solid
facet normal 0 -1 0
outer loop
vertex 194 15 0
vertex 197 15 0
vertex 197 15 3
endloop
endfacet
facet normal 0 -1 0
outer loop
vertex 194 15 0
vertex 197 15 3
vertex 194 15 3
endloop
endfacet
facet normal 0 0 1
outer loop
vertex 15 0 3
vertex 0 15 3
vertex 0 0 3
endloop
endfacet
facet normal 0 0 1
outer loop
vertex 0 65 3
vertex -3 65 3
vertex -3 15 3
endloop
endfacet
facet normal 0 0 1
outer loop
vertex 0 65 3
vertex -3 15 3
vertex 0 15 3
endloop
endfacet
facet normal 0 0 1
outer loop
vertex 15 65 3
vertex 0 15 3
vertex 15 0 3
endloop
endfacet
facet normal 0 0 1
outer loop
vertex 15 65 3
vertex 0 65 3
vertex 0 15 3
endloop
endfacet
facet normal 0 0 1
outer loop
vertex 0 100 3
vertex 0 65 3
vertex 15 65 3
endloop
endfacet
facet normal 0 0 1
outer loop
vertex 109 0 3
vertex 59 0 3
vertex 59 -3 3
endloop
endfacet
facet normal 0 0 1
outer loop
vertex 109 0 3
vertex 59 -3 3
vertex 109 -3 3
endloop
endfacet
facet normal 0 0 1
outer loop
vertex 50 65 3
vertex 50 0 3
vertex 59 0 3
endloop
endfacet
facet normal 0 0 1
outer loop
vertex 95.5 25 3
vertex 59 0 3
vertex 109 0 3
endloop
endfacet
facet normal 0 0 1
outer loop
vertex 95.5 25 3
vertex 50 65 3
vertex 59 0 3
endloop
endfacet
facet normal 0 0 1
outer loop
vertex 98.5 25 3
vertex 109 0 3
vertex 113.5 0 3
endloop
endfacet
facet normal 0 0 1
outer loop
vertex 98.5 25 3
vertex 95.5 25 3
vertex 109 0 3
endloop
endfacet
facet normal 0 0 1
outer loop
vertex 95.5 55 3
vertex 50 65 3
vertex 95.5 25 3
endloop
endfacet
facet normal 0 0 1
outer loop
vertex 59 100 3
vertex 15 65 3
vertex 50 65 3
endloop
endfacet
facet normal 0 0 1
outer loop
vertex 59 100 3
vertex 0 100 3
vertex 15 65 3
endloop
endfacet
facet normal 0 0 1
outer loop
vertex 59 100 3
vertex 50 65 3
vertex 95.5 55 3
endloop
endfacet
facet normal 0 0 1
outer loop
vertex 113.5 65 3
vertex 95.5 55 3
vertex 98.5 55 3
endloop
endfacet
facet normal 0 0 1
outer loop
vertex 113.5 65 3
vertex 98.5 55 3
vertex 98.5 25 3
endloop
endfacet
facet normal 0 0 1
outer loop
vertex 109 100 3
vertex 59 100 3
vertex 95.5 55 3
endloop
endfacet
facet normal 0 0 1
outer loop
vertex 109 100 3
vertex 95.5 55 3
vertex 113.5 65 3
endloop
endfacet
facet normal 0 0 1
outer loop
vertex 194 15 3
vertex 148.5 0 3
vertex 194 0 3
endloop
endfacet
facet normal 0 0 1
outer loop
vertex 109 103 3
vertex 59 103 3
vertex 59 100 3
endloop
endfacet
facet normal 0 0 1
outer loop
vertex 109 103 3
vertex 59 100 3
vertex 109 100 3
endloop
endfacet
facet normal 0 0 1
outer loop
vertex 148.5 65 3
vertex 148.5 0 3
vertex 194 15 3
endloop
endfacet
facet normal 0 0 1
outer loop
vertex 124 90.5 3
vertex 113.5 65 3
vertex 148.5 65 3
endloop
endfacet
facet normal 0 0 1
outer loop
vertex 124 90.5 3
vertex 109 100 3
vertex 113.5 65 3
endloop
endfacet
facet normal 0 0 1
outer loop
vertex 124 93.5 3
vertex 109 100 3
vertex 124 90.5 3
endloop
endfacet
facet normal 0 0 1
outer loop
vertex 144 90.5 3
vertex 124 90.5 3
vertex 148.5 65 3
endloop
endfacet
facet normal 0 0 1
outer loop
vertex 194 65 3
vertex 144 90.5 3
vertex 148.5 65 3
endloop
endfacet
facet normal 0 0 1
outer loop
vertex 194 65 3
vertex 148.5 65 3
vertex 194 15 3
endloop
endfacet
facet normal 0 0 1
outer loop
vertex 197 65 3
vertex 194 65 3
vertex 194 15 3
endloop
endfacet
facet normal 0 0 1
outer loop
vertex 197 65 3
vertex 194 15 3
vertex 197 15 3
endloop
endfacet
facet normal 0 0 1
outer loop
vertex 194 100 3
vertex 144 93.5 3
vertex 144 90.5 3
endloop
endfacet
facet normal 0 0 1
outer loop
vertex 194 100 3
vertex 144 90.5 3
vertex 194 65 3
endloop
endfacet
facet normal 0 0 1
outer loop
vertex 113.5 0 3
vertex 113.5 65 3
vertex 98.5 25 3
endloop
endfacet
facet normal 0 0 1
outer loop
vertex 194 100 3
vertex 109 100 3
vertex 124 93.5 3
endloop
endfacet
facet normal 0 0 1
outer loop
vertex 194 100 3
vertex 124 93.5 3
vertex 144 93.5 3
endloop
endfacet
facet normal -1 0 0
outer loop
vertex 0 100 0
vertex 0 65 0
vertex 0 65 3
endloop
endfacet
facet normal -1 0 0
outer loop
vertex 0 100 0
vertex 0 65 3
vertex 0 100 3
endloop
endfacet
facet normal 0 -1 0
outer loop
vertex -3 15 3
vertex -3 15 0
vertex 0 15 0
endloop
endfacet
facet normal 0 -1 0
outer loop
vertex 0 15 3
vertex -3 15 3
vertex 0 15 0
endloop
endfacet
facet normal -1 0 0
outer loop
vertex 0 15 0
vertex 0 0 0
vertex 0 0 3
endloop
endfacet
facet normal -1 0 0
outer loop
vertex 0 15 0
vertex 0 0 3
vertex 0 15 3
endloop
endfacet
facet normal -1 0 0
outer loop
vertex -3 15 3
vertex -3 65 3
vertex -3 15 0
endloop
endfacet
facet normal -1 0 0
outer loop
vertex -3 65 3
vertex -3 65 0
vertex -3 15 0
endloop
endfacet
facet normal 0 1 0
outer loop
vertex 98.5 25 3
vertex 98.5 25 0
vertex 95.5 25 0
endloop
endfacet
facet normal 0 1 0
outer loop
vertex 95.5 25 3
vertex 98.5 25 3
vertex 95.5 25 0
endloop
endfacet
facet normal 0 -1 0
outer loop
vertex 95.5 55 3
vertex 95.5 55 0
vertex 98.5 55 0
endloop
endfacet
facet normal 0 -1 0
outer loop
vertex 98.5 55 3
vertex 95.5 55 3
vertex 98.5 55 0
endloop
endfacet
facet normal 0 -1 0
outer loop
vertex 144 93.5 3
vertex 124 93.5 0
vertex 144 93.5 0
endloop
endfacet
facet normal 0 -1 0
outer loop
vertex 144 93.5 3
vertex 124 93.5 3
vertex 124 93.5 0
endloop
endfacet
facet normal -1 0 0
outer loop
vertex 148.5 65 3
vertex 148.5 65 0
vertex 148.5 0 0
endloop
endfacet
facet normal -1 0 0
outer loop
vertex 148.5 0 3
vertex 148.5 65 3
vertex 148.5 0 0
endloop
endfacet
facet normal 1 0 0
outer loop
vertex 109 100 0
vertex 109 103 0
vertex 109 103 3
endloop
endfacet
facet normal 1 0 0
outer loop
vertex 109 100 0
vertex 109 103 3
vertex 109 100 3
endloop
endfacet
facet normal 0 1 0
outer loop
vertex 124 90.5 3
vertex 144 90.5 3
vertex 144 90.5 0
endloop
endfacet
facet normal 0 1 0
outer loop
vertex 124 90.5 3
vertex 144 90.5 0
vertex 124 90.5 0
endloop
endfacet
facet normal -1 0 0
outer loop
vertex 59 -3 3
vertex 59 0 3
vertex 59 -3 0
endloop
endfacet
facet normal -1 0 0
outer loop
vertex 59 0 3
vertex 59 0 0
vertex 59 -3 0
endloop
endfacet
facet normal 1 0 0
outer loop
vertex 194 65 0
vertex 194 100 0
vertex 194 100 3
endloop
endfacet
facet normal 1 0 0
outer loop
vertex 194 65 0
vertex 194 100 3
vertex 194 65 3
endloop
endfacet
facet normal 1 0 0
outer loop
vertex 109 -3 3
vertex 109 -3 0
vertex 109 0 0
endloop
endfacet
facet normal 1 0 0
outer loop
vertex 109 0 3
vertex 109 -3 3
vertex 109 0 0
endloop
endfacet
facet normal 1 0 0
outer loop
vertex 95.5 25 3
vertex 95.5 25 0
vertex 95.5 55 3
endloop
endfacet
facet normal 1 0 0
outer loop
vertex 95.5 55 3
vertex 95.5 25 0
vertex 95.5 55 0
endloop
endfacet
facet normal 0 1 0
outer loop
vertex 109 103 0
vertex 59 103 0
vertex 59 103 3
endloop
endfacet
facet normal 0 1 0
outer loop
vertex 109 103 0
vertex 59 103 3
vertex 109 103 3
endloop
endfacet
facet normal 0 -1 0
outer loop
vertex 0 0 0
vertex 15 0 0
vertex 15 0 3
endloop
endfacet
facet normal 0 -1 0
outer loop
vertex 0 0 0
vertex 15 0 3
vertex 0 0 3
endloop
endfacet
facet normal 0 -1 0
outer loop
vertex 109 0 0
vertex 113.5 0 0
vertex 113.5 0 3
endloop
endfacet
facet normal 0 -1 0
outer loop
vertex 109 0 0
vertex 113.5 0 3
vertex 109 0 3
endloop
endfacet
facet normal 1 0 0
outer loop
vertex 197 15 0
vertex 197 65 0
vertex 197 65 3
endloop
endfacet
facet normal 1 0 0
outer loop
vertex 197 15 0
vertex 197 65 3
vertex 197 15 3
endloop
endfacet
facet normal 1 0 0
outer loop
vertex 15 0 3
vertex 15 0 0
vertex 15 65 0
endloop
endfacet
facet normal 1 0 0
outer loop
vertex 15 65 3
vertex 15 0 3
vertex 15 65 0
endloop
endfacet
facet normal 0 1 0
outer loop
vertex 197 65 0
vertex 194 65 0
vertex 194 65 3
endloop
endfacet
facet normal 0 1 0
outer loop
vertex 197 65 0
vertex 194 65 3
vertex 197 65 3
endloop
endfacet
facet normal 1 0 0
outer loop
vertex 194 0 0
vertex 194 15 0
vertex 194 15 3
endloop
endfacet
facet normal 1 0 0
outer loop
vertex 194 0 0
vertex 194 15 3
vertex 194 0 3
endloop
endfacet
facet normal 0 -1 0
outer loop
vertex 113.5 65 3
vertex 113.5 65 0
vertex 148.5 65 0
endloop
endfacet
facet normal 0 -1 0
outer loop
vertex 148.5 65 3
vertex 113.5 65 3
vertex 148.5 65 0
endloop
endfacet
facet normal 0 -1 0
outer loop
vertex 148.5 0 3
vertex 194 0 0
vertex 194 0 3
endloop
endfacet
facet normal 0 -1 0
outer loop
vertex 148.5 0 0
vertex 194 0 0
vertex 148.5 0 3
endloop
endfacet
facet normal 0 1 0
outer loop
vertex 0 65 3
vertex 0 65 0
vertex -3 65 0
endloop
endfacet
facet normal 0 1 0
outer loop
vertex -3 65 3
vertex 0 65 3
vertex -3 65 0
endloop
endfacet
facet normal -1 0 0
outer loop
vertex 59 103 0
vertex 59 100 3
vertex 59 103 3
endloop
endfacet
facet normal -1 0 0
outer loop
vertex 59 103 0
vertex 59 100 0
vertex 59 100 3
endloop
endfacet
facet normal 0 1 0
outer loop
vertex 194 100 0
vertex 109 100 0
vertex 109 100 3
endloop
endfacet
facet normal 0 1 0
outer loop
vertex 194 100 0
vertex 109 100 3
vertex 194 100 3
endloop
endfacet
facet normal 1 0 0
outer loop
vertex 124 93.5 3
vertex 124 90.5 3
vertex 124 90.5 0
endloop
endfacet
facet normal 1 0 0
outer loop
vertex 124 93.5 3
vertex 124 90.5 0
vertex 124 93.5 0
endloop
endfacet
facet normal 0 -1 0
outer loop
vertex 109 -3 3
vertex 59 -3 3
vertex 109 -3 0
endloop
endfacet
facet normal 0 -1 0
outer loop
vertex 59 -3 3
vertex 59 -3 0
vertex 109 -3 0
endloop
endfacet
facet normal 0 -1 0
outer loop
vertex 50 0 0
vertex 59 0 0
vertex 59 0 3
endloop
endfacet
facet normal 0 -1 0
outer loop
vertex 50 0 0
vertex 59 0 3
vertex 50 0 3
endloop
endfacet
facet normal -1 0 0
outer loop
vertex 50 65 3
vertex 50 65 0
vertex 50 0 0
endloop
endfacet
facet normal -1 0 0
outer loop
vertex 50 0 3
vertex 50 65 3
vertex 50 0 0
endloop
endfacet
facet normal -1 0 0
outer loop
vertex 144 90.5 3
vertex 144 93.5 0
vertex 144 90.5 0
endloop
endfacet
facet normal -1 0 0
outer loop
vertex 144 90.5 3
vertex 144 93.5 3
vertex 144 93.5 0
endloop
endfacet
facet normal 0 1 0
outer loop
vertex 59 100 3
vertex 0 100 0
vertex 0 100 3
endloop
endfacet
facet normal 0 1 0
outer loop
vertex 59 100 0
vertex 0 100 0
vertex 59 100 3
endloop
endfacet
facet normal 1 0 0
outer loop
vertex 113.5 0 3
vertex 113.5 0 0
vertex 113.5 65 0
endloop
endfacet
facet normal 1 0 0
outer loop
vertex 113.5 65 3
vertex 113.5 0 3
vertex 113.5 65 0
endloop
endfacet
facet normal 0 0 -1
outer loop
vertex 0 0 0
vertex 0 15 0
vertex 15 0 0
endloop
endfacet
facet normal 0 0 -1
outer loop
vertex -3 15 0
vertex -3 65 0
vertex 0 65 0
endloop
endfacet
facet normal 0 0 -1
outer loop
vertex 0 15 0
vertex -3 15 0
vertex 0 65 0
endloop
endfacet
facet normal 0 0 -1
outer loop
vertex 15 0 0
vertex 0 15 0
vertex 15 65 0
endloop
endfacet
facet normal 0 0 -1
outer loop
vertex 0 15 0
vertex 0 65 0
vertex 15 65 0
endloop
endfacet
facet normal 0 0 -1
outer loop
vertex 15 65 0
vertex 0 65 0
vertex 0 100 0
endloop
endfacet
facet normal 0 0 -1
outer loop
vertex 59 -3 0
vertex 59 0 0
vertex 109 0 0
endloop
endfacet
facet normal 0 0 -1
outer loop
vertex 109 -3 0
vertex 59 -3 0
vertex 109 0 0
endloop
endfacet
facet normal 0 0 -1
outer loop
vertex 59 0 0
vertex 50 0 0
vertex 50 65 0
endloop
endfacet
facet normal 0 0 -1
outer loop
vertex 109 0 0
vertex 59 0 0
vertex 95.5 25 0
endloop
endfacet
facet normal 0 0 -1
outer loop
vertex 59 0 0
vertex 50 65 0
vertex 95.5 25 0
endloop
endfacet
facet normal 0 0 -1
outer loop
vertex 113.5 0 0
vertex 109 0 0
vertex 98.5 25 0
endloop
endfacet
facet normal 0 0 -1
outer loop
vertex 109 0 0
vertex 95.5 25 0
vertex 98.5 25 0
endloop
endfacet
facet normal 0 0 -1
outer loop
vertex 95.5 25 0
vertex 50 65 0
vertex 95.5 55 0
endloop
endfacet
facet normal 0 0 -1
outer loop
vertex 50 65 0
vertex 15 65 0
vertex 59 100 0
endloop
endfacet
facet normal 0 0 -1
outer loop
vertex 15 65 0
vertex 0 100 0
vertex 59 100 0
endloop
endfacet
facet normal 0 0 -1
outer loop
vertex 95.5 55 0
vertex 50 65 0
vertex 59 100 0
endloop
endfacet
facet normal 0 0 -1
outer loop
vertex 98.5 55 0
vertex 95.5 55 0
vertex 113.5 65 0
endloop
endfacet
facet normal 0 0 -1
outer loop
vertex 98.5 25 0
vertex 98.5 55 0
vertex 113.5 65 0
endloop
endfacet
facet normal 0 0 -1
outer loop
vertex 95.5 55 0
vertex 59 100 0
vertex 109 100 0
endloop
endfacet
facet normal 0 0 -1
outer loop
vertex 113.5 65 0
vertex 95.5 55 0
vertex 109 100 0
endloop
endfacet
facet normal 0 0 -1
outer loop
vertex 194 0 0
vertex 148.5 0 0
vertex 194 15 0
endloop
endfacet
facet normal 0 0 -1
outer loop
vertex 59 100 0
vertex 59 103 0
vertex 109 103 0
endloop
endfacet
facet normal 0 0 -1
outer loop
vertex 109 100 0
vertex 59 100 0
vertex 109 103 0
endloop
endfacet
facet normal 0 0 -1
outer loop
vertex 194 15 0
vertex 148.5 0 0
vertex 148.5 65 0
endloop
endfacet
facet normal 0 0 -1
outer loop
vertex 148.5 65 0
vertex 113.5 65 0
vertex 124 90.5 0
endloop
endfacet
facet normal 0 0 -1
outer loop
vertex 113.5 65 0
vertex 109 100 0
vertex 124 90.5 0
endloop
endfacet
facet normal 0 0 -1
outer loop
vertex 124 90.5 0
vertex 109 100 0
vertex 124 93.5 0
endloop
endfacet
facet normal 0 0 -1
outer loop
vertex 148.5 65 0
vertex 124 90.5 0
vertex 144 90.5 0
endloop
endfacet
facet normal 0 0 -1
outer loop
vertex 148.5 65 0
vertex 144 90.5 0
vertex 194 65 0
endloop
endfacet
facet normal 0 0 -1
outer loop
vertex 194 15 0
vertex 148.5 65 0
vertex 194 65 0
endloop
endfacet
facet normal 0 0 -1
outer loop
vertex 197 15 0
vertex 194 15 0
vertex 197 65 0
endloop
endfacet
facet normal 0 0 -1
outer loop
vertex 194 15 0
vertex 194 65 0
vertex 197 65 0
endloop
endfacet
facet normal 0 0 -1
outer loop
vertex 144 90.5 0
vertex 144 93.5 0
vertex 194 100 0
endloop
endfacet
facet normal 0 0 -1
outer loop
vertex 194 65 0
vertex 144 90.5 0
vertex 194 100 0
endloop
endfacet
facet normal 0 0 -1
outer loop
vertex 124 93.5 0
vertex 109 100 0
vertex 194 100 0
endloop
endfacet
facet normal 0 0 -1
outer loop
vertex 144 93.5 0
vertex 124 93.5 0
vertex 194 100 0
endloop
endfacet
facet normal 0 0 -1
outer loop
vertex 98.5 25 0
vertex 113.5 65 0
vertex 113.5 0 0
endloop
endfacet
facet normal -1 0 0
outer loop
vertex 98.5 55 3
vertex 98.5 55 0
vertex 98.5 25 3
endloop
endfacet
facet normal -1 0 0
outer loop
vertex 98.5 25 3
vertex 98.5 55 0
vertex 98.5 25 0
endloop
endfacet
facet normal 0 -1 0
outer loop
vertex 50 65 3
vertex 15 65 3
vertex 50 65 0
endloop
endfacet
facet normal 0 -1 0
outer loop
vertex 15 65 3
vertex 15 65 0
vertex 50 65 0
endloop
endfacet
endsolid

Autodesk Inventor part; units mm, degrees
ref_plane "YZ Plane" through (0, 0, 0) normal (1, 0, 0) x (0, 1, 0)
ref_plane "XZ Plane" through (0, 0, 0) normal (0, 1, 0) x (-1, 0, 0)
ref_plane "XY Plane" through (0, 0, 0) normal (0, 0, 1) x (1, 0, 0)
sketch "Boceto1" plane through (0, 0, 0) normal (0, 0, 1) x (1, 0, 0)
  line L0 (0, 65) -> (-3, 65)
  line L1 (-3, 65) -> (-3, 15)
  line L2 (-3, 15) -> (0, 15)
  line L3 (0, 0) -> (0, 15)
  line L4 (0, 65) -> (0, 100)
  line L5 (194, 65) -> (197, 65)
  line L6 (197, 65) -> (197, 15)
  line L7 (197, 15) -> (194, 15)
  line L8 (194, 100) -> (194, 65)
  line L9 (194, 15) -> (194, 0)
  line L10 (15, 0) -> (15, 65)
  line L11 (15, 65) -> (50, 65)
  line L12 (50, 65) -> (50, 0)
  line L13 (15, 0) -> (0, 0)
  line L14 (113.5, 0) -> (113.5, 65)
  line L15 (113.5, 65) -> (148.5, 65)
  line L16 (148.5, 65) -> (148.5, 0)
  line L17 (194, 0) -> (148.5, 0)
  line L18 (95.5, 55) -> (98.5, 55)
  line L19 (98.5, 55) -> (98.5, 25)
  line L20 (98.5, 25) -> (95.5, 25)
  line L21 (95.5, 25) -> (95.5, 55)
  line L22 (59, 100) -> (59, 103)
  line L23 (59, 103) -> (109, 103)
  line L24 (109, 103) -> (109, 100)
  line L25 (0, 100) -> (59, 100)
  line L26 (109, 100) -> (194, 100)
  line L27 (109, 100) -> (209, 100) construction
  line L28 (59, 0) -> (59, -3)
  line L29 (59, -3) -> (109, -3)
  line L30 (109, -3) -> (109, 0)
  line L31 (113.5, 0) -> (109, 0)
  line L32 (59, 0) -> (50, 0)
  dimension "d0" = 194
  dimension "d1" = 100
  dimension "d3" = 50
  dimension "d8" = 3
  dimension "d13" = 35
  dimension "d14" = 65
  dimension "d15" = 15
  dimension "d16" = 3
  dimension "d17" = 30
  dimension "d19" = 95.5
  dimension "d20" = 15
  dimension "d23" = 15
  dimension "d24" = 3
  dimension "d25" = 50
  dimension "d26" = 88
  dimension "d28" = 3
  dimension "d29" = 25
extrude "Extrusión1" add sketch "Boceto1" along normal blind 3
sketch "Boceto3" plane through (0, 0, 3) normal (0, 0, 1) x (1, 0, 0)
  line L0 (124, 93.5) -> (144, 93.5)
  line L1 (144, 93.5) -> (144, 90.5)
  line L2 (144, 90.5) -> (124, 90.5)
  line L3 (124, 90.5) -> (124, 93.5)
  line L4 (148.5, 0) -> (194, 0) projected
  line L5 (194, 65) -> (194, 100) projected
  point P0 (0, 0)
  dimension "d44" = 20
  dimension "d45" = 3
  dimension "d46" = 90.5
  dimension "d47" = 50
extrude "Extrusión4" cut sketch "Boceto3" against normal blind 3
properties part number "Celda celdas" material "Madera (roble)"
